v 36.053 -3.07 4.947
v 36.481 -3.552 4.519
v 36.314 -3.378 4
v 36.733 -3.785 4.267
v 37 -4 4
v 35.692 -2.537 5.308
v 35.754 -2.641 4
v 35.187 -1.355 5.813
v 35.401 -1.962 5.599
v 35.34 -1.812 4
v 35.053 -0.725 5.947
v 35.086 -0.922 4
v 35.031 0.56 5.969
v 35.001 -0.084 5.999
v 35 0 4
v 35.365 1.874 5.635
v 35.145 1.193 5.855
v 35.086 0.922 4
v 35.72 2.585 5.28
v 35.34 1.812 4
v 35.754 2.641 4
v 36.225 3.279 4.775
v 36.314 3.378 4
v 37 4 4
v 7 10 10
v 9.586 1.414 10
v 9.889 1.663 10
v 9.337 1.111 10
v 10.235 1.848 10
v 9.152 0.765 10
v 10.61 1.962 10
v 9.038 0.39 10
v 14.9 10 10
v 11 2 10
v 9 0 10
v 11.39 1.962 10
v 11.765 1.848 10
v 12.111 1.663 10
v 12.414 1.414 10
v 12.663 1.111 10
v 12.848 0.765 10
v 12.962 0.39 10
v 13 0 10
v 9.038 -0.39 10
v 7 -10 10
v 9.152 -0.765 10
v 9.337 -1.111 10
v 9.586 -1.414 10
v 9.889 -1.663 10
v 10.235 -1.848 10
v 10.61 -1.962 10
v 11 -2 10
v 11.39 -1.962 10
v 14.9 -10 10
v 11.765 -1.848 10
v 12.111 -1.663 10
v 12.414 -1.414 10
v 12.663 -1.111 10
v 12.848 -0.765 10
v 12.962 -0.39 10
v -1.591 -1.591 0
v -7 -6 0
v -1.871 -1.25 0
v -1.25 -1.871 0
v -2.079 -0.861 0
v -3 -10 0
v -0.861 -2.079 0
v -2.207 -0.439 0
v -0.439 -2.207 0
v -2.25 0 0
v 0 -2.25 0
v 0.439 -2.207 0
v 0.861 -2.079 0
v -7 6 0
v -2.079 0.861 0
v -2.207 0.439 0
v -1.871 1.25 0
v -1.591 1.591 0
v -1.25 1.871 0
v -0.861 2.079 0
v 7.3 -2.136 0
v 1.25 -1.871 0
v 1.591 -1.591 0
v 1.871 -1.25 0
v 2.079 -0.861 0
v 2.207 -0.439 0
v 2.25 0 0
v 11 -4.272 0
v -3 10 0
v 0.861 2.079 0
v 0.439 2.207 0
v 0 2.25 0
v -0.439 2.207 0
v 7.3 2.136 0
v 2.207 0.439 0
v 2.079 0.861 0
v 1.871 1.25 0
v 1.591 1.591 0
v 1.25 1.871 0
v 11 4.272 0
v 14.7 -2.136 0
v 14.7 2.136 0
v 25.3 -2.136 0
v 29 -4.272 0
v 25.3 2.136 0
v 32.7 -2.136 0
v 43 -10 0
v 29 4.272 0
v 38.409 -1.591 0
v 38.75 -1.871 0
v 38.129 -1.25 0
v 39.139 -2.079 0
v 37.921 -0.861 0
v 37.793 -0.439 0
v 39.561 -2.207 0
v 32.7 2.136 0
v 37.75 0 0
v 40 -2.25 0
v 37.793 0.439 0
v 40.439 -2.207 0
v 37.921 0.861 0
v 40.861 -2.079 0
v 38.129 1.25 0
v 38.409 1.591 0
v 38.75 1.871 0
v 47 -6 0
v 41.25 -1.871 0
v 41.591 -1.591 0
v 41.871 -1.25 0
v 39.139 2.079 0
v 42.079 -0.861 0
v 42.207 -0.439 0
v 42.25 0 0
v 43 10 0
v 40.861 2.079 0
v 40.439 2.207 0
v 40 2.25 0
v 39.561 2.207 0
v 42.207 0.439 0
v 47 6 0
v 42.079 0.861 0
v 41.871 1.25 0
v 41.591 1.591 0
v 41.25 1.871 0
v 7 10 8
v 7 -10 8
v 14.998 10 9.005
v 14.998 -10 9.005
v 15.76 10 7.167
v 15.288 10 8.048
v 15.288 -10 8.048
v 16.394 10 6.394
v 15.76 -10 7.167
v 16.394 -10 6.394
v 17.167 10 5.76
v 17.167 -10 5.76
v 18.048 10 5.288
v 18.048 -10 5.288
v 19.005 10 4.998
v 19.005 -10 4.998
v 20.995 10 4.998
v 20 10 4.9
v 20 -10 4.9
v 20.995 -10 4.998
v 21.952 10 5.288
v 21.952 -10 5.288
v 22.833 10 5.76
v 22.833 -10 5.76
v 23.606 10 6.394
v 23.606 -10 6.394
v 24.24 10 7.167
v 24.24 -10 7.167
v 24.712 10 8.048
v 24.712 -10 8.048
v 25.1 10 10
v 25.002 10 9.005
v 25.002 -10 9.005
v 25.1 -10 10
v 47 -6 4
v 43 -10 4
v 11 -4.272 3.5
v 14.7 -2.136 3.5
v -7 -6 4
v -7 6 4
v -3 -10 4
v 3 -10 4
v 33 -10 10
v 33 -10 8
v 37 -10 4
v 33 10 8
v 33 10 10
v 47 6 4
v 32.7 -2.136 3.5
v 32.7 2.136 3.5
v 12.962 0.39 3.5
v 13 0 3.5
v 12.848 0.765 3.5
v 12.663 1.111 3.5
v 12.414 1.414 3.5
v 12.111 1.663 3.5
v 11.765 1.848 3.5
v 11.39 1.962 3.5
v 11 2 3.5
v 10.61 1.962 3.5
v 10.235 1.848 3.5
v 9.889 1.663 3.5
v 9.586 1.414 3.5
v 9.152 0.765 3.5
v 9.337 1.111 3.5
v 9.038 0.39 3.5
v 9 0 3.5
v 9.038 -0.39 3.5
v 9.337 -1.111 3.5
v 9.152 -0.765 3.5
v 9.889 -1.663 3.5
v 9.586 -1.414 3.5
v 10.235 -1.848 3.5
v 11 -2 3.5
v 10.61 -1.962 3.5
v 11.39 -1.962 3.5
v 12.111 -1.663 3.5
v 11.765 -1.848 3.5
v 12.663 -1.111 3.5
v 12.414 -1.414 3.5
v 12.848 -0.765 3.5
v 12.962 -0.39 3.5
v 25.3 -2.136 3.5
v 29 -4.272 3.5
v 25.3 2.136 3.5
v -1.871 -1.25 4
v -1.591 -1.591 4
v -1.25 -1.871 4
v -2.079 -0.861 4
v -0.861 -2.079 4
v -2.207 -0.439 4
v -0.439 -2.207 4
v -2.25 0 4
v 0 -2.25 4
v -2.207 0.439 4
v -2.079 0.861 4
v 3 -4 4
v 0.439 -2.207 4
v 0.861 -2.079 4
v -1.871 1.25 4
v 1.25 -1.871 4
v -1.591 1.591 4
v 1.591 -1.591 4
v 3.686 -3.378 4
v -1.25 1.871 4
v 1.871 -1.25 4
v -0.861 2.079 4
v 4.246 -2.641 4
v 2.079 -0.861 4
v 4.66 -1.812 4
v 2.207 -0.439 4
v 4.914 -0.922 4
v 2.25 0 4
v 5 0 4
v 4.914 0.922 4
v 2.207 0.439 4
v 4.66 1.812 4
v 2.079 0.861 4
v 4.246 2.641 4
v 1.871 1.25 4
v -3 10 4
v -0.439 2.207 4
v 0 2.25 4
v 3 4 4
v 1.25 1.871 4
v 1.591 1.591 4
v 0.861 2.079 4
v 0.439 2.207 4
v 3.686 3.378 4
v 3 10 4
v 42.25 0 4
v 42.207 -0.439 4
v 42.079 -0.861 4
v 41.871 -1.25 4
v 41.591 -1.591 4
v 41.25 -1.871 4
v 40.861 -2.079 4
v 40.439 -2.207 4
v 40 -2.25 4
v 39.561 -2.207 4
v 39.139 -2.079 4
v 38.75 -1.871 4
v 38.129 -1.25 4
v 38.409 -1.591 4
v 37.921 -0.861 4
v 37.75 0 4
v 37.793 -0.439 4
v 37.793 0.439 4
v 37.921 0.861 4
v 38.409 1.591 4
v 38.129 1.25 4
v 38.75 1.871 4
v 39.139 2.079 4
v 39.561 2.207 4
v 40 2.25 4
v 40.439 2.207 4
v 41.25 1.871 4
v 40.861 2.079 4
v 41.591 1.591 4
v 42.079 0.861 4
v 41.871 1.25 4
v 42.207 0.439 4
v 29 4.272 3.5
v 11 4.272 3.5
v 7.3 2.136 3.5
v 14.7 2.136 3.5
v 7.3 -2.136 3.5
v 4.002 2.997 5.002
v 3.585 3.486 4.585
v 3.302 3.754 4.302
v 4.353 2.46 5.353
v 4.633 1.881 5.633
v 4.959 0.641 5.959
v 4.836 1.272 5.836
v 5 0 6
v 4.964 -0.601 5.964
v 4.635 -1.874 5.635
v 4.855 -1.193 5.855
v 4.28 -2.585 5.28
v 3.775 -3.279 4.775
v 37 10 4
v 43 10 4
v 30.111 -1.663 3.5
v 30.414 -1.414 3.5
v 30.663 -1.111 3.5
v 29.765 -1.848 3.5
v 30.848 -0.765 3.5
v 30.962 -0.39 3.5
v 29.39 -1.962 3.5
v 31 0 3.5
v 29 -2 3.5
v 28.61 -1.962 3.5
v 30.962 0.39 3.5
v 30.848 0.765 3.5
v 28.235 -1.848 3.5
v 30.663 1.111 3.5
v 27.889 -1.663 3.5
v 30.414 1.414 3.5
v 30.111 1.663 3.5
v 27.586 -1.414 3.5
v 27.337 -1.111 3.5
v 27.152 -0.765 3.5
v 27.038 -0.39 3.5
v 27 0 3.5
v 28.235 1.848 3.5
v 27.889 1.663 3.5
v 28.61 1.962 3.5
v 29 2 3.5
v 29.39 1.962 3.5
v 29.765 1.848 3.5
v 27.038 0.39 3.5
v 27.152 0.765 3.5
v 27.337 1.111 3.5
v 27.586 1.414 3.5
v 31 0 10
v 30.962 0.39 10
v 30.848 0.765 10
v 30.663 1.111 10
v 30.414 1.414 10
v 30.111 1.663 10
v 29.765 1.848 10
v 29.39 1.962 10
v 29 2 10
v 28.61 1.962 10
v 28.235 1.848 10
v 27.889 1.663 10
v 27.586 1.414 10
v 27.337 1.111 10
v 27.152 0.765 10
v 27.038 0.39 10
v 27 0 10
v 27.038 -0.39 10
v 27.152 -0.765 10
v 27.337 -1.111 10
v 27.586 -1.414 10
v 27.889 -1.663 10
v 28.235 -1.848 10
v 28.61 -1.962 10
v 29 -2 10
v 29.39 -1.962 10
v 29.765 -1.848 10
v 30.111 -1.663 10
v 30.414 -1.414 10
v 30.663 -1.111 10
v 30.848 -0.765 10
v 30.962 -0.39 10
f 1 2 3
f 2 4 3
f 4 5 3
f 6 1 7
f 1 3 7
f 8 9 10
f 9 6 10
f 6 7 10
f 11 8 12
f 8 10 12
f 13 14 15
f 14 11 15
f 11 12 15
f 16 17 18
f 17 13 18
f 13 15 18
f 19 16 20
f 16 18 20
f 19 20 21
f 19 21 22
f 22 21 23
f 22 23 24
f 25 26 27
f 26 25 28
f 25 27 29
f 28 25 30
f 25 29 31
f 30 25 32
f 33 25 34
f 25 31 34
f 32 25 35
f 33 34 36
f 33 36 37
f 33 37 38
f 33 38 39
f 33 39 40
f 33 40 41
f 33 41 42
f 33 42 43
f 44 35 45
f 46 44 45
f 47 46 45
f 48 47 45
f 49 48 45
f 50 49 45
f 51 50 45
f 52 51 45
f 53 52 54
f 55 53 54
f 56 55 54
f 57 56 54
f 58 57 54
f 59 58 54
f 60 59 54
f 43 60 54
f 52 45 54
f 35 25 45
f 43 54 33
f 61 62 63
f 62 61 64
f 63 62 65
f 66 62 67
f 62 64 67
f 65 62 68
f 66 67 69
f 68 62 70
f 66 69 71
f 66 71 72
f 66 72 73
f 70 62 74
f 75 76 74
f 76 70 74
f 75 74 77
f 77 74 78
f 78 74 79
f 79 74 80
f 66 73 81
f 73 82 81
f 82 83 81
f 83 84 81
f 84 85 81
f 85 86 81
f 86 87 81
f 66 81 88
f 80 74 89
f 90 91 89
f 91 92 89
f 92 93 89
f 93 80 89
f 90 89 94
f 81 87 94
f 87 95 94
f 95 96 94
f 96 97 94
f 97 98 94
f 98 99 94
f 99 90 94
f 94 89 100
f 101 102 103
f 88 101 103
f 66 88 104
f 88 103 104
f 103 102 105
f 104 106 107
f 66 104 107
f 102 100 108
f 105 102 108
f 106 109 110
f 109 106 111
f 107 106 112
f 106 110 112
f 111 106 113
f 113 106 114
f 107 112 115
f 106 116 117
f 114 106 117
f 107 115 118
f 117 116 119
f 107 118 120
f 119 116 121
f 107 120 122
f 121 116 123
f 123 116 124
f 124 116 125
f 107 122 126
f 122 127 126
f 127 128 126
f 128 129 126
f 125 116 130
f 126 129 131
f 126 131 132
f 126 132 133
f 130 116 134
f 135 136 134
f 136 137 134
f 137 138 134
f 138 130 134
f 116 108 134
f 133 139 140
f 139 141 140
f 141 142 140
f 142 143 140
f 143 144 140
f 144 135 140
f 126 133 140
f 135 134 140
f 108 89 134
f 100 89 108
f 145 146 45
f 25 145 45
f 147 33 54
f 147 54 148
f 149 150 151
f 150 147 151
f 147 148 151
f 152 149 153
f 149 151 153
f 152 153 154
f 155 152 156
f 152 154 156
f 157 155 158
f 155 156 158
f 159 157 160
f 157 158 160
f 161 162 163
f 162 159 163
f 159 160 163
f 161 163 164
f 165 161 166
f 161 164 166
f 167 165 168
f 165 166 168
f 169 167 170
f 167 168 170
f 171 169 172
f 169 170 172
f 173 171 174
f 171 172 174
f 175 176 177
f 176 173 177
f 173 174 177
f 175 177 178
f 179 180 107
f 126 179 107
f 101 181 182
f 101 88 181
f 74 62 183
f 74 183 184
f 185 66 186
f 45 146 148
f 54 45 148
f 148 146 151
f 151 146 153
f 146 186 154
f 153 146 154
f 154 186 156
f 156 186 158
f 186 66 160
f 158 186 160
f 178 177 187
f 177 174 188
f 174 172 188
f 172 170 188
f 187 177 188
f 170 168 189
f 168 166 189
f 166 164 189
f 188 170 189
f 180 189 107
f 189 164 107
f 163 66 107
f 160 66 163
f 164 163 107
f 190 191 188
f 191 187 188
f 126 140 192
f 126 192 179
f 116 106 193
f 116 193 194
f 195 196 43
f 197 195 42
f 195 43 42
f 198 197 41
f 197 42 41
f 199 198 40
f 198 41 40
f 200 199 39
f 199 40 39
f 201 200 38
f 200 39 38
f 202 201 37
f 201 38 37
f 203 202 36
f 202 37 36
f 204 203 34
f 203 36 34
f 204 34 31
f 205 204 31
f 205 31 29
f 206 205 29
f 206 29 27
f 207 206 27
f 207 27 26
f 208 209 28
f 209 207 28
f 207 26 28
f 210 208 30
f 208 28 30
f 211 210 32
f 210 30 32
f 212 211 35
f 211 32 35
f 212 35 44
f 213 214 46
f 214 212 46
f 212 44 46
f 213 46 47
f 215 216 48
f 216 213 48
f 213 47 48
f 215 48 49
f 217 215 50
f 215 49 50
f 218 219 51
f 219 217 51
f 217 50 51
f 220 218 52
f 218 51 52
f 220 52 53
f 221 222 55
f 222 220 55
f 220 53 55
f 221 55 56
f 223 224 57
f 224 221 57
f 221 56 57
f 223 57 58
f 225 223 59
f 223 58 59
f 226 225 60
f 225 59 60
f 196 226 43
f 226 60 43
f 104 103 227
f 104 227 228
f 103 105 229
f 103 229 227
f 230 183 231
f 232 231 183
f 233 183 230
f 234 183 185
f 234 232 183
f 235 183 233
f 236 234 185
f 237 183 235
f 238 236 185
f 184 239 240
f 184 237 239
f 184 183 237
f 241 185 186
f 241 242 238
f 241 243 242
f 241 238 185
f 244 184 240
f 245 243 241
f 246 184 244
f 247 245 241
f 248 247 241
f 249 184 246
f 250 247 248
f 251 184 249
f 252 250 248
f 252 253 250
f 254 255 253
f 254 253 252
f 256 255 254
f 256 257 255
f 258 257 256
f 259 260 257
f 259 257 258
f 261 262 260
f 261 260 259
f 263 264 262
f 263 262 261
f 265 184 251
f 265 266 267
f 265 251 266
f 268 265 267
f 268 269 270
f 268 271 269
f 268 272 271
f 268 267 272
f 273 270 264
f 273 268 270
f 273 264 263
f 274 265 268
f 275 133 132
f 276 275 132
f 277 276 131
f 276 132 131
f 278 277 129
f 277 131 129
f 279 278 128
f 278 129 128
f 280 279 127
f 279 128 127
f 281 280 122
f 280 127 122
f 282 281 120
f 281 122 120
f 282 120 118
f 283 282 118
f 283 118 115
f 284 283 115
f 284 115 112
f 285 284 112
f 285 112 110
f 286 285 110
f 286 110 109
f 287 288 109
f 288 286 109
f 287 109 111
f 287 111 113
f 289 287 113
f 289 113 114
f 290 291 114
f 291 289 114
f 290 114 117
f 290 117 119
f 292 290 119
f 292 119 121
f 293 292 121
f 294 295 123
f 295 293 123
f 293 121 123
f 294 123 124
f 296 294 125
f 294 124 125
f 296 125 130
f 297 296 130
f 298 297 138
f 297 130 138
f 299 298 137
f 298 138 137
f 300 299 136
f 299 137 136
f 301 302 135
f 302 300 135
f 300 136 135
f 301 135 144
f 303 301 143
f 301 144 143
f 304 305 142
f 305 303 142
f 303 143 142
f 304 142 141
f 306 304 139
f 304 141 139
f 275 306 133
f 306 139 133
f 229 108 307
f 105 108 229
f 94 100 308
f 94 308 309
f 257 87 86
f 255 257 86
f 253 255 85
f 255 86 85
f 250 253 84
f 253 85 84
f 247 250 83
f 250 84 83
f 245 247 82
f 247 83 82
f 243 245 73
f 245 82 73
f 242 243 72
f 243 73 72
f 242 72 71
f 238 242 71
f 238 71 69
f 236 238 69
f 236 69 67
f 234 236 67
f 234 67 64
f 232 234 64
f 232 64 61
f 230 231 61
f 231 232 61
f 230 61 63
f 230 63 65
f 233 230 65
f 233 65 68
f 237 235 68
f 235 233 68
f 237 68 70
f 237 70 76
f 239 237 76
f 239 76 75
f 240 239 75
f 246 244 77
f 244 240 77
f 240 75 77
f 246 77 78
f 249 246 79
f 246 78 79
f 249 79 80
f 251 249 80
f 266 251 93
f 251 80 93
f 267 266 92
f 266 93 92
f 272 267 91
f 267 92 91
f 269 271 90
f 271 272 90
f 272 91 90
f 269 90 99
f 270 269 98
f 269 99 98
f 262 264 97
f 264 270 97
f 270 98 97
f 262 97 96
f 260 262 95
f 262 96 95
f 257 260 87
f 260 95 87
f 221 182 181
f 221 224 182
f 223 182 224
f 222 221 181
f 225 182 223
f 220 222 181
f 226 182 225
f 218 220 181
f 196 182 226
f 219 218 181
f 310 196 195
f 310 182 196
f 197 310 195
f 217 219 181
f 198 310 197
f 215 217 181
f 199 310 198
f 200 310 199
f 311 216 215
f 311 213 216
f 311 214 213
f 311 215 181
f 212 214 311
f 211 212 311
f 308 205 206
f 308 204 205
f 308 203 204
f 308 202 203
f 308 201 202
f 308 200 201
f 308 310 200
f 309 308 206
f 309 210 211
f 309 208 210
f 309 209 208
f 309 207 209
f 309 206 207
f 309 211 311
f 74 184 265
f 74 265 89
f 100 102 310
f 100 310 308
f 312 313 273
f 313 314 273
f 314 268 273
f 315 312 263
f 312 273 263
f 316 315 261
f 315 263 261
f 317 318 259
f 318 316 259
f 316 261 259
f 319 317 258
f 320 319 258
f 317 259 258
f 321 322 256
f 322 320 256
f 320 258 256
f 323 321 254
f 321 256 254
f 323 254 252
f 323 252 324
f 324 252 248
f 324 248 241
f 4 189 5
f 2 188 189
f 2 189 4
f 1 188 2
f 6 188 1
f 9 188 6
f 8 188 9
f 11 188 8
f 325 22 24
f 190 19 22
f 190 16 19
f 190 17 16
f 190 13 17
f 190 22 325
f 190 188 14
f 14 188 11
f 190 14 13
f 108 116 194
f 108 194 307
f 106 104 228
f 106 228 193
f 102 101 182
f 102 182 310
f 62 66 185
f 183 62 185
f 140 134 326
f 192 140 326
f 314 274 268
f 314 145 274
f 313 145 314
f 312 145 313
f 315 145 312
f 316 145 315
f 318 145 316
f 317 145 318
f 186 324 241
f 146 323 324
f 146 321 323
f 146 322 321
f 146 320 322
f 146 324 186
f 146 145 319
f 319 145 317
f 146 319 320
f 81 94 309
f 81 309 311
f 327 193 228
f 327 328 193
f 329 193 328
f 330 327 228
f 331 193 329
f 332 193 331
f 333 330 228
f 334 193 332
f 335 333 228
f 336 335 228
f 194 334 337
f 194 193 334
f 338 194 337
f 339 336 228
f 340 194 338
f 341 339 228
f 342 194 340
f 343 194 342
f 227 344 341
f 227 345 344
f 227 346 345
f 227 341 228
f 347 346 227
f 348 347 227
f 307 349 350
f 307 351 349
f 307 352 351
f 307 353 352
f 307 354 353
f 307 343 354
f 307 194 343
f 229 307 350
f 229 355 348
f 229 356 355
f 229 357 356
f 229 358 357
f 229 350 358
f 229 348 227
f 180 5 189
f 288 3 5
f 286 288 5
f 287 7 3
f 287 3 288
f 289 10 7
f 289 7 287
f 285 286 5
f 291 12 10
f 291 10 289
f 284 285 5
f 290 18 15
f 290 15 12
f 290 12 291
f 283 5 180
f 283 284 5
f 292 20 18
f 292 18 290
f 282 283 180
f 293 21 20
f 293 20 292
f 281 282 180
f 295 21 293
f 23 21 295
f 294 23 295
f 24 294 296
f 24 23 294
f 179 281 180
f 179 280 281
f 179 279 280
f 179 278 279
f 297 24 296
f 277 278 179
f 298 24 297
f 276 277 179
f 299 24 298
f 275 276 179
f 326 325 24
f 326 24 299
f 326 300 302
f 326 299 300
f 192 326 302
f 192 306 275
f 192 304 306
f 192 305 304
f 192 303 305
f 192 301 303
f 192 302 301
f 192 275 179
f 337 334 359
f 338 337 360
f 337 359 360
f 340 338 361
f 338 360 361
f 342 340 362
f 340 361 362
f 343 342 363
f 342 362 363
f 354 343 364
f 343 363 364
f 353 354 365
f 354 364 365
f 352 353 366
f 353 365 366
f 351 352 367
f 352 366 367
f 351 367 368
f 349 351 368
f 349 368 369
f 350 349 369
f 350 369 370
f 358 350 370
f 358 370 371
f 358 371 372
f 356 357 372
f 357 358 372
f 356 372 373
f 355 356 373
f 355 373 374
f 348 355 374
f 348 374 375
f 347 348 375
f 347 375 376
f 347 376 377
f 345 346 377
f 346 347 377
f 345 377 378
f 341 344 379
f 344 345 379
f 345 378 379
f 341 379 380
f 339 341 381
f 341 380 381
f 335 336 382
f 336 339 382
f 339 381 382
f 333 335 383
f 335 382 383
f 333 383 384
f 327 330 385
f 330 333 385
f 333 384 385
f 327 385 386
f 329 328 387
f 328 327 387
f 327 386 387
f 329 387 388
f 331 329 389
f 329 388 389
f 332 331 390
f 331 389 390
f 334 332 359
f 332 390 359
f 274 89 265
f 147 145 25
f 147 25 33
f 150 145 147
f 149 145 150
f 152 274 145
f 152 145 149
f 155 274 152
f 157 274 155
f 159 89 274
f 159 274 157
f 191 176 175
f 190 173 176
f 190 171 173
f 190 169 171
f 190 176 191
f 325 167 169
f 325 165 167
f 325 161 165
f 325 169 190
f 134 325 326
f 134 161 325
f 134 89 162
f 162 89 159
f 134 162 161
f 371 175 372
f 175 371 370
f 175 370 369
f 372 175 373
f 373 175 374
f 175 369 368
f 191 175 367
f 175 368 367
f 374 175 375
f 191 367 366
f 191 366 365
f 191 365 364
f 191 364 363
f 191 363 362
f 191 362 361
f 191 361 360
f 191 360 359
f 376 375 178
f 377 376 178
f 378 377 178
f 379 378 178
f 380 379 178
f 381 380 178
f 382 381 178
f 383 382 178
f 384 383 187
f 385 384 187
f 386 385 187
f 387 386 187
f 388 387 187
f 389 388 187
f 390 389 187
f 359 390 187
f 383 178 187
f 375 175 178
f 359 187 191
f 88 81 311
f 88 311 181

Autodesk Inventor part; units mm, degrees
ref_plane "YZ Plane" through (0, 0, 0) normal (1, 0, 0) x (0, 1, 0)
ref_plane "XZ Plane" through (0, 0, 0) normal (0, 1, 0) x (-1, 0, 0)
sketch "Sketch1" plane through (0, 0, 0) normal (0, 0, 1) x (1, 0, 0)
  circle A0 centre (0, 0) radius 2.25
  circle A1 centre (40, 0) radius 2.25
  line L0 (-7, 10) -> (47, 10)
  line L1 (-7, -10) -> (47, -10)
  line L2 (-7, -10) -> (-7, 10)
  line L3 (47, 10) -> (47, -10)
  dimension "d0" = 4.5
  dimension "d1" = 4.5
  dimension "d2" = 40
  dimension "d48" = 7
  dimension "d49" = 7
  dimension "d50" = 20
  dimension "d51" = 10
extrude "Extrusion1" add sketch "Sketch1" along normal blind 4
ref_plane "Work Plane1" through (-7, 0, 0) normal (0, 1, 0) x (1, 0, 0)
sketch "Sketch4" plane through (-7, 0, 0) normal (0, 1, 0) x (1, 0, 0)
  line L0 (0, 0) -> (54, 0) projected
  line L1 (0, 0) -> (0, -4) projected
  line L2 (54, -4) -> (0, -4) projected
  line L3 (54, 0) -> (54, -4) projected
  line L4 (0, 0) -> (0, 0) projected
  line L5 (0, 0) -> (0, -4) projected
  line L6 (0, -4) -> (0, -4) projected
  line L7 (0, 0) -> (0, -4) projected
  line L8 (40, 0) -> (40, 0) projected
  line L9 (40, 0) -> (40, -4) projected
  line L10 (40, -4) -> (40, -4) projected
  line L11 (40, 0) -> (40, -4) projected
  circle A0 centre (27, -10) radius 5.1
  line L12 (14, -4) -> (14, -10)
  line L13 (14, -10) -> (21.9, -10)
  line L14 (32.1, -10) -> (40, -10)
  line L15 (40, -10) -> (40, -4)
  line L16 (0, -4) -> (54, -4) projected
  line L17 (14, -4) -> (40, -4)
  point P0 (7, 0)
  dimension "d23" = 10.2
  dimension "d24" = 6
  dimension "d25" = 26
  dimension "d26" = 13
  dimension "d27" = 14
extrude "Extrusion4" add sketch "Sketch4" along normal mid plane 20 contours L15 L14 A0 L13 L12 L2
chamfer "Chamfer1" distance 4 angle 45 2 edges at (7, 0, 4) (33, 0, 4)
sketch "Sketch5" plane through (0, 0, 4) normal (0, 0, 1) x (1, 0, 0)
  circle A0 centre (40, 0) radius 2.25 projected
  line L0 (3, 10) -> (-7, 10) projected
  line L1 (-7, -10) -> (3, -10) projected
  circle A1 centre (0, 0) radius 2.25 projected
  circle A2 centre (0, 0) radius 5
  circle A3 centre (40, 0) radius 2.25 projected
  circle A4 centre (40, 0) radius 5
  circle A5 centre (40, 0) radius 2.25 projected
  line L2 (47, -10) -> (47, 10) projected
  line L3 (47, 10) -> (37, 10) projected
  line L4 (-7, 10) -> (-7, -10) projected
  line L5 (37, -10) -> (37, 10) projected
  line L6 (37, -10) -> (47, -10) projected
  line L7 (3, 10) -> (3, -10) projected
  point P0 (39.5, -2.4495)
  point P1 (39.5, 2.4495)
  dimension "d33" = 10
  dimension "d34" = 10
extrude "Extrusion5" cut sketch "Sketch5" along normal up to surface (6 mm away) contours L7 A2 | A2 L7 | A1 | A4 L5 | L5 A4
sketch "Sketch6" plane through (7, 10, 10) normal (0, 0, 1) x (1, 0, 0)
  line L0 (26, -20) -> (26, 0) projected
  line L1 (18.1, 0) -> (26, 0) projected
  line L2 (18.1, -20) -> (18.1, 0) projected
  line L3 (26, -20) -> (18.1, -20) projected
  circle A0 centre (4, -10) radius 2
  circle A1 centre (22, -10) radius 2
  point P0 (-7, -10)
  dimension "d37" = 4
  dimension "d38" = 4
  dimension "d39" = 10
  dimension "d40" = 18
  dimension "d41" = 3.9
extrude "Extrusion6" cut sketch "Sketch6" against normal up to surface (10 mm away) contours A0 | A1
sketch "Sketch7" plane through (0, 0, 0) normal (0, 0, -1) x (-1, 0, 0)
  circle A0 centre (-11, 0) radius 2 projected
  circle A1 centre (-29, 0) radius 2 projected
  line L0 (-29, 4.2724) -> (-25.3, 2.1362)
  line L1 (-25.3, 2.1362) -> (-25.3, -2.1362)
  line L2 (-25.3, -2.1362) -> (-29, -4.2724)
  line L3 (-29, -4.2724) -> (-32.7, -2.1362)
  line L4 (-32.7, -2.1362) -> (-32.7, 2.1362)
  line L5 (-32.7, 2.1362) -> (-29, 4.2724)
  line L6 (-11, 4.2724) -> (-7.3, 2.1362)
  line L7 (-7.3, 2.1362) -> (-7.3, -2.1362)
  line L8 (-7.3, -2.1362) -> (-11, -4.2724)
  line L9 (-11, -4.2724) -> (-14.7, -2.1362)
  line L10 (-14.7, -2.1362) -> (-14.7, 2.1362)
  line L11 (-14.7, 2.1362) -> (-11, 4.2724)
  dimension "d44" = 7.4
extrude "Extrusion7" cut sketch "Sketch7" against normal blind 3.5
chamfer "Chamfer2" distance 4 angle 45 4 edges at (-7, 10, 2) (-7, -10, 2) (47, 10, 2) (47, -10, 2)
properties part number "ZAxisRodClampBody" material "ABS Plastic"
